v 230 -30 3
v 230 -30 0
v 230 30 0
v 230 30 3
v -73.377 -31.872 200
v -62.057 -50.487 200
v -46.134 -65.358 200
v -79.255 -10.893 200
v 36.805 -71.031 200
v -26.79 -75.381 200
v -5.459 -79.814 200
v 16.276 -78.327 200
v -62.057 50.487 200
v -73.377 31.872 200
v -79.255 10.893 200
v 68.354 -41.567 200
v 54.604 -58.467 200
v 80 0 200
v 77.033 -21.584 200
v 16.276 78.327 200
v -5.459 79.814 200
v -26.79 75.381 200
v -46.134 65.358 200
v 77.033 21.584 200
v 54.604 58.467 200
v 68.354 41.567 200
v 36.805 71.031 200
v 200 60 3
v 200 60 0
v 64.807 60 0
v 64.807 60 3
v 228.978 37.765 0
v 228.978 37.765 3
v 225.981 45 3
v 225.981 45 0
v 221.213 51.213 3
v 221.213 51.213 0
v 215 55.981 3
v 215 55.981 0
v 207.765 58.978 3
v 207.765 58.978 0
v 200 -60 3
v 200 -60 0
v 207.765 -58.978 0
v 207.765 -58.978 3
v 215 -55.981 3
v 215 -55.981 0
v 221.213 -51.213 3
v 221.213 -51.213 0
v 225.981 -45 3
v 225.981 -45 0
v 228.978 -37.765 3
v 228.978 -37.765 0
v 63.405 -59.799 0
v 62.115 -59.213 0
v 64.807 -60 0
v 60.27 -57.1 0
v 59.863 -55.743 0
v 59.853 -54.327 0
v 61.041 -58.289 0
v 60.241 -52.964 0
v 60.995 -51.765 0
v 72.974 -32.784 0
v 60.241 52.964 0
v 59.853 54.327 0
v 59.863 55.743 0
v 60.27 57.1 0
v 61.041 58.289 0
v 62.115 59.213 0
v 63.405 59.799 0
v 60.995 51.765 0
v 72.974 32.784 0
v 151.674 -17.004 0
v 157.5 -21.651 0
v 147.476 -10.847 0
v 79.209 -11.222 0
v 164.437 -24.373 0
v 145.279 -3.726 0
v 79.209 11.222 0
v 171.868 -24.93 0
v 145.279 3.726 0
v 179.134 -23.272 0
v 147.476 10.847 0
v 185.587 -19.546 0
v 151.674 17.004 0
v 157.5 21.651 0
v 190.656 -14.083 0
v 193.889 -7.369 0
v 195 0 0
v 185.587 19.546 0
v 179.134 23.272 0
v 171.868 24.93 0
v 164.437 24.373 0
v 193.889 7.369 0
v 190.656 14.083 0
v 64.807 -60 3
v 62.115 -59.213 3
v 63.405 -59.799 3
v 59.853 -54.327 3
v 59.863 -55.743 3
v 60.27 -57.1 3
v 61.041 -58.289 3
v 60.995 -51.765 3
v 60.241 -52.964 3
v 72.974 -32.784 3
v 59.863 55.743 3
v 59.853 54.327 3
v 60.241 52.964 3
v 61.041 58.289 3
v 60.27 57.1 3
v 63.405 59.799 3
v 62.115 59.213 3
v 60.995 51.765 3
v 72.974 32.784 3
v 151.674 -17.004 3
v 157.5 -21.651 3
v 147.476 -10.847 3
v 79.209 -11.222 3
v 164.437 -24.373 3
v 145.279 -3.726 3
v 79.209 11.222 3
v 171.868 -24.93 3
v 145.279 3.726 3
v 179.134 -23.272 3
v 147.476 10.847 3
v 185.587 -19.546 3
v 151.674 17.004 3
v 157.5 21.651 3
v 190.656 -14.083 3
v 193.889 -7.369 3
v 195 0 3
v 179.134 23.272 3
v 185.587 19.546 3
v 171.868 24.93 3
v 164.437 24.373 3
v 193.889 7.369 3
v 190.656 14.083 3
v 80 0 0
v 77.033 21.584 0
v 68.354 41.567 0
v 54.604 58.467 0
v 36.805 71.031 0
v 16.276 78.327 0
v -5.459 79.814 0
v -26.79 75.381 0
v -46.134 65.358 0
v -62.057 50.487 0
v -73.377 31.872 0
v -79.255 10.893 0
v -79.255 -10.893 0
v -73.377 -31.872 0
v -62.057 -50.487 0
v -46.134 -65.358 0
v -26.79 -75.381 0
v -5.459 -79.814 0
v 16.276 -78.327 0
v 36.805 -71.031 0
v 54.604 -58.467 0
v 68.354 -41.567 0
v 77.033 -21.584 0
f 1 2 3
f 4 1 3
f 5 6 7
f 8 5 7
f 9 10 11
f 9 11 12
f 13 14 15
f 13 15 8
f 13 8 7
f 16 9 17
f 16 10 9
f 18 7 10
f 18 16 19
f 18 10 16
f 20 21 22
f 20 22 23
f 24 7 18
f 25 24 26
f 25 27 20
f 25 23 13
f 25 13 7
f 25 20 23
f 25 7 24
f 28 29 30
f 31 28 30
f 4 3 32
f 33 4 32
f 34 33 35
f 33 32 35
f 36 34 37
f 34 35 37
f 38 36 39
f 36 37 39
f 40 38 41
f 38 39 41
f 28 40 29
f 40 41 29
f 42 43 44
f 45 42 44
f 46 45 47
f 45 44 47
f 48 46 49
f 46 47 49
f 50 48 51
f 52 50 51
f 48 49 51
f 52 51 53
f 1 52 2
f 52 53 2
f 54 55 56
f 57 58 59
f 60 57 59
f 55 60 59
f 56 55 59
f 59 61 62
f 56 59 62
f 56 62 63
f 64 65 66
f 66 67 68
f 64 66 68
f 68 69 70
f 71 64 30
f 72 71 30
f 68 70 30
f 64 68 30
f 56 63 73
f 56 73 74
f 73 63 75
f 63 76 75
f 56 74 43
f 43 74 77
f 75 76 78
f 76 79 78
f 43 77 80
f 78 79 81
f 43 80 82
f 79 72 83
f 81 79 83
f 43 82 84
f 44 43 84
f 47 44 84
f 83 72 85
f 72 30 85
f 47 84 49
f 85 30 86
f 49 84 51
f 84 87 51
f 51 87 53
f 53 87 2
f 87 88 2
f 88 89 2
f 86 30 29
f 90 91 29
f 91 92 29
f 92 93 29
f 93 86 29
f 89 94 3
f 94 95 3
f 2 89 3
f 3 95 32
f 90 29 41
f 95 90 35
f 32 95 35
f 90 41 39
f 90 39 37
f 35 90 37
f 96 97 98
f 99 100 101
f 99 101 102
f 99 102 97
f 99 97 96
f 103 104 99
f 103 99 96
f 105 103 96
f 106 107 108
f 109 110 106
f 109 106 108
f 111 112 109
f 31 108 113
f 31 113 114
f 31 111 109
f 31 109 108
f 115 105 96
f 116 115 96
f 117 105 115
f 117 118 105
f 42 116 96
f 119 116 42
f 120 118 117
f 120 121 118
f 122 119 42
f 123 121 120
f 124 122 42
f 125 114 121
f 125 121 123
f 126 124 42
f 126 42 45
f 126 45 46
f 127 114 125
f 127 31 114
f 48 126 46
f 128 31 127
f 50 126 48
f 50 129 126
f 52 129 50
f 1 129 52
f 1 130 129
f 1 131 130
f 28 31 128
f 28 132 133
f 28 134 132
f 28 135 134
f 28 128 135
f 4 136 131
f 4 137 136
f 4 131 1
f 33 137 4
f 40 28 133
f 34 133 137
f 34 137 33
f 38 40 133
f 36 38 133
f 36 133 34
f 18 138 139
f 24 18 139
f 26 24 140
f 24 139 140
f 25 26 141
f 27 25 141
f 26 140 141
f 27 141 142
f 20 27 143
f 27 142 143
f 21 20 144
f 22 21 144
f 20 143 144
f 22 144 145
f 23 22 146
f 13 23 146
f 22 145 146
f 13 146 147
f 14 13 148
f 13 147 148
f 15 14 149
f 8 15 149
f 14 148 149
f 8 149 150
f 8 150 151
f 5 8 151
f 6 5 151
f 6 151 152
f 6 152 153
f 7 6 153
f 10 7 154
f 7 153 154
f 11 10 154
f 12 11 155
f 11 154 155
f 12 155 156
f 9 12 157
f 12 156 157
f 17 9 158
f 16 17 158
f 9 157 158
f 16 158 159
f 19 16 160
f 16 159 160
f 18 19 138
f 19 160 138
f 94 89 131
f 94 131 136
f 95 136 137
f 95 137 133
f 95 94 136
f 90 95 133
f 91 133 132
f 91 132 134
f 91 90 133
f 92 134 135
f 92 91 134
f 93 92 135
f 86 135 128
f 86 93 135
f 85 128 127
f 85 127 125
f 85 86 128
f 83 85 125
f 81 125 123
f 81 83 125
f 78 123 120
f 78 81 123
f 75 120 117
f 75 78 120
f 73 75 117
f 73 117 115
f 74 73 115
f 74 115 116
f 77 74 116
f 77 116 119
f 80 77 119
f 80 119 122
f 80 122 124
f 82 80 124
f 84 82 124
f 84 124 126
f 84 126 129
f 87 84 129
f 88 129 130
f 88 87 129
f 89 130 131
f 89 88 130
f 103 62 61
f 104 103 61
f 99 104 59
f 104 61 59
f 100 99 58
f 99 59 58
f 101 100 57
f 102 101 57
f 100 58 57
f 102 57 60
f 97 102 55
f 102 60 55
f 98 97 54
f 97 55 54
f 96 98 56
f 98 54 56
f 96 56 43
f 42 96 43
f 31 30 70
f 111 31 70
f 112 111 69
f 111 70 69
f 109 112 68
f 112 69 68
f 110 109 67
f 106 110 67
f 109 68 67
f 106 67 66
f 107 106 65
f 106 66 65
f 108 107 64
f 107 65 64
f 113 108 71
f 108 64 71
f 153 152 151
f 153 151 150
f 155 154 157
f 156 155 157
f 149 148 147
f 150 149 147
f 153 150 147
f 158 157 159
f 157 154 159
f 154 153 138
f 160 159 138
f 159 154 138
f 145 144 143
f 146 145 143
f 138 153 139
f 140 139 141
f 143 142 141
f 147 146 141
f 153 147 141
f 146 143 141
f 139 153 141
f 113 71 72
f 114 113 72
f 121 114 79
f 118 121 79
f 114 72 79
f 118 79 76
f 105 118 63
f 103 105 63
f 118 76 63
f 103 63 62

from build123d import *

# Parameters (mm, degrees)
F0_R     = 80
F1_DEPTH = 200
F2_R     = 25
F3_DEPTH = 3


with BuildPart() as f1:
    # F0 (on Top) → F1 (new body)
    with BuildSketch(Plane.XY):
        Circle(F0_R)
    extrude(amount=F1_DEPTH)


with BuildPart() as f3:
    # F2 (on Top) → F3 (new body)
    with BuildSketch(Plane.XY):
        with BuildLine():
            Line((200, 60), (64.807407, 60))
            ThreePointArc((64.807407, 60), (60.269981, 57.10042), (60.995207, 51.764706))
            ThreePointArc((60.995207, 51.764706), (80, 0), (60.995207, -51.764706))
            ThreePointArc((60.995207, -51.764706), (60.269981, -57.10042), (64.807407, -60))
            Line((64.807407, -60), (200, -60))
            ThreePointArc((200, -60), (221.213203, -51.213203), (230, -30))
            Line((230, -30), (230, 30))
            ThreePointArc((230, 30), (221.213203, 51.213203), (200, 60))
        make_face()
        with Locations((170, 0)):
            Circle(F2_R, mode=Mode.SUBTRACT)
    extrude(amount=F3_DEPTH)


solid = Compound([f1.part, f3.part])
